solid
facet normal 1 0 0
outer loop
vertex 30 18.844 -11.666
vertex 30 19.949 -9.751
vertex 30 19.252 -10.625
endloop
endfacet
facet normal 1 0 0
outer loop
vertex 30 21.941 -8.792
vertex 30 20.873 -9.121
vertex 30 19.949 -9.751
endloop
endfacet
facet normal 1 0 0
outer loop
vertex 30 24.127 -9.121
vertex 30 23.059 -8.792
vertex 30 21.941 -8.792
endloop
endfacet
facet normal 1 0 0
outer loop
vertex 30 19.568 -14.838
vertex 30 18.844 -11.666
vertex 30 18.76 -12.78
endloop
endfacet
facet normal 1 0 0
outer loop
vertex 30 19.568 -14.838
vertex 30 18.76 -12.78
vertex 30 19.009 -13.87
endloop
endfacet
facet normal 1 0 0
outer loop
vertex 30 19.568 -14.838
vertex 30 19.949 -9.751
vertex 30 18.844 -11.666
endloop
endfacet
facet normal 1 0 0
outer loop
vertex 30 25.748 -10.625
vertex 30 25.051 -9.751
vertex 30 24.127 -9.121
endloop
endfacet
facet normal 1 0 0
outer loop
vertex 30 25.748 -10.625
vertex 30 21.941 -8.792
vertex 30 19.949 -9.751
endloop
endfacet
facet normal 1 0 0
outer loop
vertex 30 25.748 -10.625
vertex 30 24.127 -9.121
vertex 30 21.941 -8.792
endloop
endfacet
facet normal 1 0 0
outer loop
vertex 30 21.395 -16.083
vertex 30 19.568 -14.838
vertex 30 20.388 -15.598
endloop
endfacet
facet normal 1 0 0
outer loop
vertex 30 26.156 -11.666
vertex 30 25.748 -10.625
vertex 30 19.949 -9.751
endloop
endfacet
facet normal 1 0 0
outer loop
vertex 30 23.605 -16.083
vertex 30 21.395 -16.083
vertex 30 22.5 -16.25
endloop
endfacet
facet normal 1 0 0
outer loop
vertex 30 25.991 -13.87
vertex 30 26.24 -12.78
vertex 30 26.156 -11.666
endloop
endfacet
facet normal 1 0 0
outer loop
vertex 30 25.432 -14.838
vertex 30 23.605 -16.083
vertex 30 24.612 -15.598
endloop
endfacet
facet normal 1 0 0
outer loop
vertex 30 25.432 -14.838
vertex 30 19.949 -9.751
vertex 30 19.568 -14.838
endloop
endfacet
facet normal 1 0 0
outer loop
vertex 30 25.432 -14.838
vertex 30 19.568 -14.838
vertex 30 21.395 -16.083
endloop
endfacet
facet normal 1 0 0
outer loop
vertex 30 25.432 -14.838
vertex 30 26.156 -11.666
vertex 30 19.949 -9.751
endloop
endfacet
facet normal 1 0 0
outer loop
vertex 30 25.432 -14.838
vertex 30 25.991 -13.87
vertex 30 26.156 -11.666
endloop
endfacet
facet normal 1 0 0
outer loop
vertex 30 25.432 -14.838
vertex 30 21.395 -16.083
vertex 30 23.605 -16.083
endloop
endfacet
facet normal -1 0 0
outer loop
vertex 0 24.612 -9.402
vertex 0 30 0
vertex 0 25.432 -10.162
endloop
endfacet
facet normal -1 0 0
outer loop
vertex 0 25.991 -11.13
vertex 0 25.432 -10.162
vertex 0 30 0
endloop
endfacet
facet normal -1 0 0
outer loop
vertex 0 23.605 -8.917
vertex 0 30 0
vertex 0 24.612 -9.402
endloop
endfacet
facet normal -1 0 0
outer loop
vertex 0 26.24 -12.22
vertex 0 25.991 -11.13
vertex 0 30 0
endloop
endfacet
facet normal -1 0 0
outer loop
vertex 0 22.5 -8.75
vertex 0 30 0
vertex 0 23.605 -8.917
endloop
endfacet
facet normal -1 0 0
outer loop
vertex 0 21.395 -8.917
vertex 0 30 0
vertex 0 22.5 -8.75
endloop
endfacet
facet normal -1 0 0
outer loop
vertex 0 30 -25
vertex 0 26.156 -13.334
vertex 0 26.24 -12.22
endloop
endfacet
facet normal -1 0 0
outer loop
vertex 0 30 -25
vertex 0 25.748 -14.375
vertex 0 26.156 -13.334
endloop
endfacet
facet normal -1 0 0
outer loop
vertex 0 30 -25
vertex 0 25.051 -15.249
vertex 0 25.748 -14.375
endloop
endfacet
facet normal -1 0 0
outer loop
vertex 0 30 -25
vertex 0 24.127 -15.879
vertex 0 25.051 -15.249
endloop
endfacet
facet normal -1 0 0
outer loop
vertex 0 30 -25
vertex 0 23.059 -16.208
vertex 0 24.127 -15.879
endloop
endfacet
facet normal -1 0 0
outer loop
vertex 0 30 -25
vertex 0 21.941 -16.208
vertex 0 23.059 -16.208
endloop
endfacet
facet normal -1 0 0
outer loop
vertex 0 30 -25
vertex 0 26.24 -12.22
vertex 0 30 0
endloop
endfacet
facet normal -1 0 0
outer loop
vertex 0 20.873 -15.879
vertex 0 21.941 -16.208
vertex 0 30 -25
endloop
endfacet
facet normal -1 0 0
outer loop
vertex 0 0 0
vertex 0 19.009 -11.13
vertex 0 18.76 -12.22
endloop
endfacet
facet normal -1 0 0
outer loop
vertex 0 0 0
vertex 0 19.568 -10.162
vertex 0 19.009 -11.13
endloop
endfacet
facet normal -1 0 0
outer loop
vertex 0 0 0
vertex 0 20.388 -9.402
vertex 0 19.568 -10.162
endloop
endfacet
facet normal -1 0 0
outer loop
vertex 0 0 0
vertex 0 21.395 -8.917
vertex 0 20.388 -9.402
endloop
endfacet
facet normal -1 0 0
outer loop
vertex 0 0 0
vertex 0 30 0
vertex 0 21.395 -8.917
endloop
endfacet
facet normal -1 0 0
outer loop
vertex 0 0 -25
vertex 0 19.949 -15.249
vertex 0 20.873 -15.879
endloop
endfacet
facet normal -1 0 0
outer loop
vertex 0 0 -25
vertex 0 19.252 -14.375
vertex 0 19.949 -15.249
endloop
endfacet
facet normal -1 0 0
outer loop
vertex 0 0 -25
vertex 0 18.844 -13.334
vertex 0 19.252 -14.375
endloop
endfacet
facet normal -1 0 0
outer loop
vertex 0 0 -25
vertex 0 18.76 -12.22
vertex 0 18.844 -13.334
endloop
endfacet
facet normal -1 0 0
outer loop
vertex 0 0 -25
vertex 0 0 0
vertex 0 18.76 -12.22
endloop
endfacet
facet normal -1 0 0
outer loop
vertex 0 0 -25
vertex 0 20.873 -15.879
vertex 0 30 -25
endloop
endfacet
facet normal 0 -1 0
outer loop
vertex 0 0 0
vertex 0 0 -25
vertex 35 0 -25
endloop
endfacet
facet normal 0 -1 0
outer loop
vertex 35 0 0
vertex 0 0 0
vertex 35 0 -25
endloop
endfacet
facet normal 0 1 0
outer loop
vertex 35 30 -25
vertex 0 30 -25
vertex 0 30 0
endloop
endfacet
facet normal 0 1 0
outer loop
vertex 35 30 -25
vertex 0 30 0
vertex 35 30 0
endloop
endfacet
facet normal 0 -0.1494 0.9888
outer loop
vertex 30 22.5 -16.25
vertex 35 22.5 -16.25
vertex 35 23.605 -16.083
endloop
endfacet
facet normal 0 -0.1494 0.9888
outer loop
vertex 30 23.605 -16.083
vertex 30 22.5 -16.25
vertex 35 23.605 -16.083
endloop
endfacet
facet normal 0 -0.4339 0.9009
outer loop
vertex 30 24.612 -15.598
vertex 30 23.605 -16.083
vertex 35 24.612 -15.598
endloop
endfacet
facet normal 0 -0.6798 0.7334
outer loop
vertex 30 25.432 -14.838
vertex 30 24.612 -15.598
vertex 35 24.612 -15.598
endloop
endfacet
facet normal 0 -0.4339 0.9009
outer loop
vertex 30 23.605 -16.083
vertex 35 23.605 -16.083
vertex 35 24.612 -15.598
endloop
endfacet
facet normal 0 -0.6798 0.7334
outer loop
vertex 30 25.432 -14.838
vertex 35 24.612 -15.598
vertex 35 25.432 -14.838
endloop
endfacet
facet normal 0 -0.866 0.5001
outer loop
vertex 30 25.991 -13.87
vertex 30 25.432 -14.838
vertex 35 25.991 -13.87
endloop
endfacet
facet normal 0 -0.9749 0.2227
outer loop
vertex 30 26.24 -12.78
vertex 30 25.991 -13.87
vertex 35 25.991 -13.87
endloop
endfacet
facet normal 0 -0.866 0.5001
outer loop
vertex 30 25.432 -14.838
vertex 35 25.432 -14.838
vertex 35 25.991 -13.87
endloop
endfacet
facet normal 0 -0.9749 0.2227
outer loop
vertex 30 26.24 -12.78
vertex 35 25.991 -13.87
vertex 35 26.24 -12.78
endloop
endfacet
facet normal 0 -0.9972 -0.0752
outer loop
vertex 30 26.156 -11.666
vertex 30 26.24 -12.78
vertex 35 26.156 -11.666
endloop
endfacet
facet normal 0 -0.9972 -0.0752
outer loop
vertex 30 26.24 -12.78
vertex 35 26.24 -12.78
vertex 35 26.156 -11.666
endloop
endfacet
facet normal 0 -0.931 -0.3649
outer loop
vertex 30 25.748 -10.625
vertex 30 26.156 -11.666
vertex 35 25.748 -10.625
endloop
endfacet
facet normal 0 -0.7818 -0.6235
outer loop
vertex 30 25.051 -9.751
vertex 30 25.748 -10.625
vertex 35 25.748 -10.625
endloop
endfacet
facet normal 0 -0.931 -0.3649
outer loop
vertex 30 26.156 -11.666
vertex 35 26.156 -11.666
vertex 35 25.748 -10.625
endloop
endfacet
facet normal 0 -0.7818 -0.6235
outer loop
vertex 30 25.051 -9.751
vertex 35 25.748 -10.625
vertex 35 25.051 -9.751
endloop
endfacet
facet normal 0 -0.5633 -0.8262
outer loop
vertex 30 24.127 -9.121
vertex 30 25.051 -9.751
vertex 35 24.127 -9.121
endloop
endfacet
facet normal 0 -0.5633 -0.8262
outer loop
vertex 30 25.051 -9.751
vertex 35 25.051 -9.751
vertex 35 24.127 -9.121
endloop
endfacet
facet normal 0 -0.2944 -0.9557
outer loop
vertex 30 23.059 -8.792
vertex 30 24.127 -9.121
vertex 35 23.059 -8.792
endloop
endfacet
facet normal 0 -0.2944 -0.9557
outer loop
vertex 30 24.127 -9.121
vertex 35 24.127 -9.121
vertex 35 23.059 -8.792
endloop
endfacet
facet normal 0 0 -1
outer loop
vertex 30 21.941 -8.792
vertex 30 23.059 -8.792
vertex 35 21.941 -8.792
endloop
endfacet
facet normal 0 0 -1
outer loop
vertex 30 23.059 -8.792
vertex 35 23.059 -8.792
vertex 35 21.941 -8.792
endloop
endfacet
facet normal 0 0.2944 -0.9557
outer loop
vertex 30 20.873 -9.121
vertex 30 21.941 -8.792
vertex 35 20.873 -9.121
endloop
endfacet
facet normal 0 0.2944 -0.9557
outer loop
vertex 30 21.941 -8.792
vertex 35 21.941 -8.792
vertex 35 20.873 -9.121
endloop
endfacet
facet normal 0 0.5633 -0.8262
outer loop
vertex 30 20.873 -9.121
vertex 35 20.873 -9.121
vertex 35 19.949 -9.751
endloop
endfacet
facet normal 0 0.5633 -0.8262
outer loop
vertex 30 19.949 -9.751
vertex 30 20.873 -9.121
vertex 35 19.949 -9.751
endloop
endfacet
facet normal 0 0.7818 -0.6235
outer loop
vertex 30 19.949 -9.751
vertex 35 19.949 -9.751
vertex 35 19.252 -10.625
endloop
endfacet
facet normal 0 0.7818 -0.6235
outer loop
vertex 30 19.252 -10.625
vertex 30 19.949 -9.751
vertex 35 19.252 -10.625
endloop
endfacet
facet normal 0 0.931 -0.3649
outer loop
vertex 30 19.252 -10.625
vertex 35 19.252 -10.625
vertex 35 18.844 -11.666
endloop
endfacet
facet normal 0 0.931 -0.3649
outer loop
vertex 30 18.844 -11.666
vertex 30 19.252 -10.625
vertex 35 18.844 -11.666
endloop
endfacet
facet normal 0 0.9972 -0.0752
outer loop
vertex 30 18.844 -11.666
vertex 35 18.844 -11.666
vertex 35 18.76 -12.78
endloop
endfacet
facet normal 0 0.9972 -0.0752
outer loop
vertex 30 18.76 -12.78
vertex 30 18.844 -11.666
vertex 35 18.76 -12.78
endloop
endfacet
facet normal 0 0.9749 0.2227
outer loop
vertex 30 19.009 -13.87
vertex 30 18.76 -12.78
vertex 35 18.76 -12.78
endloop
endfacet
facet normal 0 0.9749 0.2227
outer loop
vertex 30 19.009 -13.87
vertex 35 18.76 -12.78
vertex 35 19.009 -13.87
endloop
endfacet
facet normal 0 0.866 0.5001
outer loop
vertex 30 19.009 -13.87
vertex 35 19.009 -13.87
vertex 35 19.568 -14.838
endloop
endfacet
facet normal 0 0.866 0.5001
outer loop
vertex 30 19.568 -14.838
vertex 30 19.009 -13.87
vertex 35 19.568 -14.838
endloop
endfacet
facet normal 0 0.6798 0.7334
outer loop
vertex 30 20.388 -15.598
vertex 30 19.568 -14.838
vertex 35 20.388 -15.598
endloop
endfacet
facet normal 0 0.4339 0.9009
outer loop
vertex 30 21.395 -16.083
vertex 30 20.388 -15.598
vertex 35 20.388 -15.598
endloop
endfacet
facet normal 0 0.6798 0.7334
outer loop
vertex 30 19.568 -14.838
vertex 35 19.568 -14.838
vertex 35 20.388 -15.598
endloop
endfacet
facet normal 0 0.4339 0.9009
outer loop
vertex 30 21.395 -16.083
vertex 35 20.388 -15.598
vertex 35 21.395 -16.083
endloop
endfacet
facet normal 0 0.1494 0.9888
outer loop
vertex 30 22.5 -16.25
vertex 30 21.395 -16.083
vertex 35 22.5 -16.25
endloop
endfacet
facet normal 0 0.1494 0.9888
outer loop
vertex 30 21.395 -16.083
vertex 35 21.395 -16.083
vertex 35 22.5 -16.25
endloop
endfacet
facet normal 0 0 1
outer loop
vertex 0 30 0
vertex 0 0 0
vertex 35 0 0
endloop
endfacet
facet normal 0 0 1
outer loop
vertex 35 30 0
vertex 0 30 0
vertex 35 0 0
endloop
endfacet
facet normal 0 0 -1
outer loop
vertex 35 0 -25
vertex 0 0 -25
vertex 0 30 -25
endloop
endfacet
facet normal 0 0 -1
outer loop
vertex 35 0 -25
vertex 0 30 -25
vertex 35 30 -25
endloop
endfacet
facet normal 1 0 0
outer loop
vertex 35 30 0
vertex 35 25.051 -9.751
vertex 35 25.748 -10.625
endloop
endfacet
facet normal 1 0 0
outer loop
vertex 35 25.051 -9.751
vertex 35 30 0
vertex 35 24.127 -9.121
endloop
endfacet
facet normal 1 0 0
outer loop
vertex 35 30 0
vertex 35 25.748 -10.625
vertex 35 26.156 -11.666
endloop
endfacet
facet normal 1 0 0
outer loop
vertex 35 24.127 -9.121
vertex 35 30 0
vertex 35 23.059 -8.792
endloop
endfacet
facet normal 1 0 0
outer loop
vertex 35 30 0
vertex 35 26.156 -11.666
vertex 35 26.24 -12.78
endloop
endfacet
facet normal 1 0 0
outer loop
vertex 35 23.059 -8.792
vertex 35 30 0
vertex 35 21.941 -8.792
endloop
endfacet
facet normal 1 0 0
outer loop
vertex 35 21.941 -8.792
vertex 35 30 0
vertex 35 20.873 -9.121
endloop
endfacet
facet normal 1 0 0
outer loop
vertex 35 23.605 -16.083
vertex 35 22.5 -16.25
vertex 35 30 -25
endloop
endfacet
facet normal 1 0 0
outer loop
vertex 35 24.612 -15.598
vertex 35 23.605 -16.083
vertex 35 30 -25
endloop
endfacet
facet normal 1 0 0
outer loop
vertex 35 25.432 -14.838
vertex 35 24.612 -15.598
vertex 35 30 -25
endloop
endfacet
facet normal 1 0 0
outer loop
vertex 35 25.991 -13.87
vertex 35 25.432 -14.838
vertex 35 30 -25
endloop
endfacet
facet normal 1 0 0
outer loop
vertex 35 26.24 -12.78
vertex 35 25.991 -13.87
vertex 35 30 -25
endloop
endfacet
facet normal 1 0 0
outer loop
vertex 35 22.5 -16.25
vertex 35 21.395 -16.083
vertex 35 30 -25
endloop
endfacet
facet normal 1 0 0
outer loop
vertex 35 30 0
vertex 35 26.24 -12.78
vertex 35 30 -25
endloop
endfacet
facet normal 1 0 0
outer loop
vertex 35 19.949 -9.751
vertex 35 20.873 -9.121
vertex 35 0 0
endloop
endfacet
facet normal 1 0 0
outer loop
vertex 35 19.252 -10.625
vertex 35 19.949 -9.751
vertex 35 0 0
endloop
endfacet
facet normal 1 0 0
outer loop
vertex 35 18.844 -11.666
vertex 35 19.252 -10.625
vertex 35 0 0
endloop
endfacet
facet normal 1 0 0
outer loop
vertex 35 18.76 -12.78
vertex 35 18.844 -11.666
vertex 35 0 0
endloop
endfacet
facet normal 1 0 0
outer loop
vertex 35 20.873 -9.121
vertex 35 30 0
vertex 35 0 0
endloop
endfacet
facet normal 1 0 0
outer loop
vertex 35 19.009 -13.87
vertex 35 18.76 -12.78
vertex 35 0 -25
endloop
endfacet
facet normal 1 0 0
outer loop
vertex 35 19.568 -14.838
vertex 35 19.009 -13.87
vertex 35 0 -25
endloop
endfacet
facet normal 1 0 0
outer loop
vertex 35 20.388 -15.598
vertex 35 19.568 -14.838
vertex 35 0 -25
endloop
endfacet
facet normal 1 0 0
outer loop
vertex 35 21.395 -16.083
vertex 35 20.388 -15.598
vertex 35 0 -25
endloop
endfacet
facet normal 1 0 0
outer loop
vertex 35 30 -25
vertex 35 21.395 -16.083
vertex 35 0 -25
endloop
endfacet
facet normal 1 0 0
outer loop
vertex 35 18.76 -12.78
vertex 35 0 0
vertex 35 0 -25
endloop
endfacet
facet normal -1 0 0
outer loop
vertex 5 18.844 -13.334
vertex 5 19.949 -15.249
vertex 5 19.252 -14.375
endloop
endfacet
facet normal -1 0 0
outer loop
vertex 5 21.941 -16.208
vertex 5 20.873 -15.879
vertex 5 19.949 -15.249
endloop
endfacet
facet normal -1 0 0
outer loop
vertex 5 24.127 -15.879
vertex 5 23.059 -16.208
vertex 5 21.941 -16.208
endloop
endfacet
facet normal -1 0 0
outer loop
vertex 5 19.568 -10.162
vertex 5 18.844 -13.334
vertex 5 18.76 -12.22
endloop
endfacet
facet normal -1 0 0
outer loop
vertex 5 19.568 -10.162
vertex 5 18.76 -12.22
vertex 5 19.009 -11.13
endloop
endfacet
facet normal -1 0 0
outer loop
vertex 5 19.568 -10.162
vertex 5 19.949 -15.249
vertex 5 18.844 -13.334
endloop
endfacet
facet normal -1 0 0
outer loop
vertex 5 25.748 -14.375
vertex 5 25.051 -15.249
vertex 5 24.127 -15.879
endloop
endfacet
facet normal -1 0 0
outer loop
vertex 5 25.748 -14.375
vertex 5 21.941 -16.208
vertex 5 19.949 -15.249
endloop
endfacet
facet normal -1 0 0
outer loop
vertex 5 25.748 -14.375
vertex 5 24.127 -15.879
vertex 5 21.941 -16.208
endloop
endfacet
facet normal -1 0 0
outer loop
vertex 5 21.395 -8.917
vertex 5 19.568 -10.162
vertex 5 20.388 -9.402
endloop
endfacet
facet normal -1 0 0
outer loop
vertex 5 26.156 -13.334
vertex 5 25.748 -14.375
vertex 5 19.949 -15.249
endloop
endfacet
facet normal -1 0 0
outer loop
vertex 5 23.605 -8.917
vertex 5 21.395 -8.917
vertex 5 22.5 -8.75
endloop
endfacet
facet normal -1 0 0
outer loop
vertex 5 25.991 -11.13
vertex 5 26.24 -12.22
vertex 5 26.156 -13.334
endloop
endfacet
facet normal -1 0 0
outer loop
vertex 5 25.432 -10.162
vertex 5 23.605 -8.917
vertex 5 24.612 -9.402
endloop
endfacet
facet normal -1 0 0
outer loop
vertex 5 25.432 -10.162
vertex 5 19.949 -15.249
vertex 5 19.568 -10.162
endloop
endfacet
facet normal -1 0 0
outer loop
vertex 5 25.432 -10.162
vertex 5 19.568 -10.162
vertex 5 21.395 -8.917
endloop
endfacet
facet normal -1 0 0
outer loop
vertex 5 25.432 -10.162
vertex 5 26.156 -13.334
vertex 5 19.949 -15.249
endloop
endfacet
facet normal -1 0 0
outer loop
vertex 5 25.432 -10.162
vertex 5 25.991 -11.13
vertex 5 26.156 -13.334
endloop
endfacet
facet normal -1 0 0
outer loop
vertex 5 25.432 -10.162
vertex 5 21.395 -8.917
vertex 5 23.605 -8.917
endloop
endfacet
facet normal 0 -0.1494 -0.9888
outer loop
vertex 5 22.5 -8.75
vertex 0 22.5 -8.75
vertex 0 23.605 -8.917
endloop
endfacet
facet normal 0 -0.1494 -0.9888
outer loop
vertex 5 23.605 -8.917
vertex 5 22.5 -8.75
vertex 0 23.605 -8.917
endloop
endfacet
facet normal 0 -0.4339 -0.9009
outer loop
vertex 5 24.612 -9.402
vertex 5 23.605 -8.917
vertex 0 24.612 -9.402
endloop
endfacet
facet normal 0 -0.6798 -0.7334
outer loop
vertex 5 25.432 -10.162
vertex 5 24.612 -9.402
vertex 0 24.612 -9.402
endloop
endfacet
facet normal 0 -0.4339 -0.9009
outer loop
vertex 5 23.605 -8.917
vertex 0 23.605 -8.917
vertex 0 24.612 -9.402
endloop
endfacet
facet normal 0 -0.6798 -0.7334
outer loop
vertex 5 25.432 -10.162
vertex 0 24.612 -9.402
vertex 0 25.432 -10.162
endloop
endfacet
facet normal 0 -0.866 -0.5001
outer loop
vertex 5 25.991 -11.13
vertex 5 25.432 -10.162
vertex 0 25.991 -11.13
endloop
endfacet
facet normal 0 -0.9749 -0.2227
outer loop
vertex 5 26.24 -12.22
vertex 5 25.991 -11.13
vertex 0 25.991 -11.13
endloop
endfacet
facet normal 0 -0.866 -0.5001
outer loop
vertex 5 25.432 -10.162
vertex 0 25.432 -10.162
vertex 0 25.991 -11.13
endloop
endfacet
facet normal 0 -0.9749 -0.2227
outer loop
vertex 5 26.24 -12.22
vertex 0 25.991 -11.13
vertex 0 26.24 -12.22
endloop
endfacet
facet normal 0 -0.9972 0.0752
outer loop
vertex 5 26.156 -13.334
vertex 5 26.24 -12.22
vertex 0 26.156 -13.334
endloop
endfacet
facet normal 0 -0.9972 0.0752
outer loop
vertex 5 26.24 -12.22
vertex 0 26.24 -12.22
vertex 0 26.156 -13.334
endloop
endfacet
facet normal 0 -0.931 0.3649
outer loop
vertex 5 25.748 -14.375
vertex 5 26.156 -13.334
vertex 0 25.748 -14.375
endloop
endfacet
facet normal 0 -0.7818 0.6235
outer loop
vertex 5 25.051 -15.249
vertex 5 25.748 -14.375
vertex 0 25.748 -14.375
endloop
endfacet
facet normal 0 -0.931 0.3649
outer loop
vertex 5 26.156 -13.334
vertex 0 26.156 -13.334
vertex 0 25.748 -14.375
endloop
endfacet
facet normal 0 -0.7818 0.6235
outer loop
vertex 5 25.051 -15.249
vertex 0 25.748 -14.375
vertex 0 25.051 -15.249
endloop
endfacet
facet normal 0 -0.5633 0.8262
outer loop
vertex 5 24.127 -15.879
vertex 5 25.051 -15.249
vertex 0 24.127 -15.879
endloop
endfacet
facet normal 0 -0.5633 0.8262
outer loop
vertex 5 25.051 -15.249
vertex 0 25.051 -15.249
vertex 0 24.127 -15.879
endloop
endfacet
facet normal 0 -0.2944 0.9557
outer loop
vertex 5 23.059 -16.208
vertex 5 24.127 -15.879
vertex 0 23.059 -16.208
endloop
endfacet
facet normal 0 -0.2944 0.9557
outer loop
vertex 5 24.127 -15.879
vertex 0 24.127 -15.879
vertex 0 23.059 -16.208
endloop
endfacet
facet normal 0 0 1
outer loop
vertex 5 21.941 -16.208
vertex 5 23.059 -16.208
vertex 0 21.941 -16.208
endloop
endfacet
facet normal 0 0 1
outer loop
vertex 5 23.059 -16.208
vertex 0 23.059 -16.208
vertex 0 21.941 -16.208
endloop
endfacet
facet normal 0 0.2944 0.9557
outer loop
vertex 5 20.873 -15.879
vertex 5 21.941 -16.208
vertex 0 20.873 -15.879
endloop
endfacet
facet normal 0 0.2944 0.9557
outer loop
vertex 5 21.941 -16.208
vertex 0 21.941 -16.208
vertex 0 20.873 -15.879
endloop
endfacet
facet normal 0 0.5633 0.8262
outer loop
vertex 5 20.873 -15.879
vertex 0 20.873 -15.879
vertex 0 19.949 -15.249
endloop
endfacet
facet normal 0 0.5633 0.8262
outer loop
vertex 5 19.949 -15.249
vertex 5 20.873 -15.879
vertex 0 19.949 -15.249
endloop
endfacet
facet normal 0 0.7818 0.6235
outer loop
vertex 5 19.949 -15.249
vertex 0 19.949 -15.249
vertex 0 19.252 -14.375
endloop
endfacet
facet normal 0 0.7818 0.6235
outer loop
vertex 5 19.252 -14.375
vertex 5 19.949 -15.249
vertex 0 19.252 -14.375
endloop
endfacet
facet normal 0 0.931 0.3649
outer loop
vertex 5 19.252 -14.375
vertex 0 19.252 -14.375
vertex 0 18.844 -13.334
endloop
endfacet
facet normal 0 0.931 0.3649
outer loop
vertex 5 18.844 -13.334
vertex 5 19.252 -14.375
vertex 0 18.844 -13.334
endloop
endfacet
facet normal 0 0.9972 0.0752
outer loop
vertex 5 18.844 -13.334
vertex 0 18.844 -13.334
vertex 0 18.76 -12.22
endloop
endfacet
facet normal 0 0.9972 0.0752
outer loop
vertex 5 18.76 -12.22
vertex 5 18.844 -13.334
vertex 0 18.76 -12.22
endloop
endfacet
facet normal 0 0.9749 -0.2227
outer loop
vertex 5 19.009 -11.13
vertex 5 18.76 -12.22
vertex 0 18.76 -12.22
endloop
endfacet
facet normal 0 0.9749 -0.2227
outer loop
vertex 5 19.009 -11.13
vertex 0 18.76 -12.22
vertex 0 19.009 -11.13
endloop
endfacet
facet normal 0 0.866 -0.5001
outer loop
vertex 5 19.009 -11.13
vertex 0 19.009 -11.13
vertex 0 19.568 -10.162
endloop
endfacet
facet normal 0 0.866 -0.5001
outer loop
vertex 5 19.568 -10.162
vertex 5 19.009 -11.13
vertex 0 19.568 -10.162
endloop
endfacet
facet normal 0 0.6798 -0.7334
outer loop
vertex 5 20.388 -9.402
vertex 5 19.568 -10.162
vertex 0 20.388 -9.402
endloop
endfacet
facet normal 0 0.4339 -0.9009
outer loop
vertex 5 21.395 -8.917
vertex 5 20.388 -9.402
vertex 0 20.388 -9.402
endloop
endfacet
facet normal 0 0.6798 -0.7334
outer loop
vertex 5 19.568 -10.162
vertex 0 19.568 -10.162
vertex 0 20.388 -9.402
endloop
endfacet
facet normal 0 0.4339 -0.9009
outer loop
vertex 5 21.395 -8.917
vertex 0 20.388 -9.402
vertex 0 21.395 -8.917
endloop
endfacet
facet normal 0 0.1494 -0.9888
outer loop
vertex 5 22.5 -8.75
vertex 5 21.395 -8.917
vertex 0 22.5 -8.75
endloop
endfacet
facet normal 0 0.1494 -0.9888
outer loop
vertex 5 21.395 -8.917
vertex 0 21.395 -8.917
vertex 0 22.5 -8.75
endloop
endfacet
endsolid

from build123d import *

# Parameters (mm, degrees)
SKETCH1_W           = 35
SKETCH1_H           = 25
BOSS_EXTRUDE1_DEPTH = 30
SKETCH2_R           = 3.75
CUT_EXTRUDE1_DEPTH  = 5
SKETCH3_R           = 3.75
CUT_EXTRUDE2_DEPTH  = 5


with BuildPart() as part:
    # Sketch1 → Boss-Extrude1 (new body)
    with BuildSketch(Plane(origin=(0, 0, 0), x_dir=(1, 0, 0), z_dir=(0, 1, 0))):
        with Locations((17.5, 12.5)):
            Rectangle(SKETCH1_W, SKETCH1_H)
    extrude(amount=BOSS_EXTRUDE1_DEPTH)

    # Sketch2 → Cut-Extrude1 (cut)
    with BuildSketch(Plane(origin=(35, 0, 0), x_dir=(0, 0, -1), z_dir=(1, 0, 0))):
        with Locations((12.5, 22.5)):
            Circle(SKETCH2_R)
    extrude(amount=-CUT_EXTRUDE1_DEPTH, mode=Mode.SUBTRACT)

    # Sketch3 → Cut-Extrude2 (cut)
    with BuildSketch(Plane.ZY):
        with Locations((-12.5, 22.5)):
            Circle(SKETCH3_R)
    extrude(amount=-CUT_EXTRUDE2_DEPTH, mode=Mode.SUBTRACT)


solid = part.part
